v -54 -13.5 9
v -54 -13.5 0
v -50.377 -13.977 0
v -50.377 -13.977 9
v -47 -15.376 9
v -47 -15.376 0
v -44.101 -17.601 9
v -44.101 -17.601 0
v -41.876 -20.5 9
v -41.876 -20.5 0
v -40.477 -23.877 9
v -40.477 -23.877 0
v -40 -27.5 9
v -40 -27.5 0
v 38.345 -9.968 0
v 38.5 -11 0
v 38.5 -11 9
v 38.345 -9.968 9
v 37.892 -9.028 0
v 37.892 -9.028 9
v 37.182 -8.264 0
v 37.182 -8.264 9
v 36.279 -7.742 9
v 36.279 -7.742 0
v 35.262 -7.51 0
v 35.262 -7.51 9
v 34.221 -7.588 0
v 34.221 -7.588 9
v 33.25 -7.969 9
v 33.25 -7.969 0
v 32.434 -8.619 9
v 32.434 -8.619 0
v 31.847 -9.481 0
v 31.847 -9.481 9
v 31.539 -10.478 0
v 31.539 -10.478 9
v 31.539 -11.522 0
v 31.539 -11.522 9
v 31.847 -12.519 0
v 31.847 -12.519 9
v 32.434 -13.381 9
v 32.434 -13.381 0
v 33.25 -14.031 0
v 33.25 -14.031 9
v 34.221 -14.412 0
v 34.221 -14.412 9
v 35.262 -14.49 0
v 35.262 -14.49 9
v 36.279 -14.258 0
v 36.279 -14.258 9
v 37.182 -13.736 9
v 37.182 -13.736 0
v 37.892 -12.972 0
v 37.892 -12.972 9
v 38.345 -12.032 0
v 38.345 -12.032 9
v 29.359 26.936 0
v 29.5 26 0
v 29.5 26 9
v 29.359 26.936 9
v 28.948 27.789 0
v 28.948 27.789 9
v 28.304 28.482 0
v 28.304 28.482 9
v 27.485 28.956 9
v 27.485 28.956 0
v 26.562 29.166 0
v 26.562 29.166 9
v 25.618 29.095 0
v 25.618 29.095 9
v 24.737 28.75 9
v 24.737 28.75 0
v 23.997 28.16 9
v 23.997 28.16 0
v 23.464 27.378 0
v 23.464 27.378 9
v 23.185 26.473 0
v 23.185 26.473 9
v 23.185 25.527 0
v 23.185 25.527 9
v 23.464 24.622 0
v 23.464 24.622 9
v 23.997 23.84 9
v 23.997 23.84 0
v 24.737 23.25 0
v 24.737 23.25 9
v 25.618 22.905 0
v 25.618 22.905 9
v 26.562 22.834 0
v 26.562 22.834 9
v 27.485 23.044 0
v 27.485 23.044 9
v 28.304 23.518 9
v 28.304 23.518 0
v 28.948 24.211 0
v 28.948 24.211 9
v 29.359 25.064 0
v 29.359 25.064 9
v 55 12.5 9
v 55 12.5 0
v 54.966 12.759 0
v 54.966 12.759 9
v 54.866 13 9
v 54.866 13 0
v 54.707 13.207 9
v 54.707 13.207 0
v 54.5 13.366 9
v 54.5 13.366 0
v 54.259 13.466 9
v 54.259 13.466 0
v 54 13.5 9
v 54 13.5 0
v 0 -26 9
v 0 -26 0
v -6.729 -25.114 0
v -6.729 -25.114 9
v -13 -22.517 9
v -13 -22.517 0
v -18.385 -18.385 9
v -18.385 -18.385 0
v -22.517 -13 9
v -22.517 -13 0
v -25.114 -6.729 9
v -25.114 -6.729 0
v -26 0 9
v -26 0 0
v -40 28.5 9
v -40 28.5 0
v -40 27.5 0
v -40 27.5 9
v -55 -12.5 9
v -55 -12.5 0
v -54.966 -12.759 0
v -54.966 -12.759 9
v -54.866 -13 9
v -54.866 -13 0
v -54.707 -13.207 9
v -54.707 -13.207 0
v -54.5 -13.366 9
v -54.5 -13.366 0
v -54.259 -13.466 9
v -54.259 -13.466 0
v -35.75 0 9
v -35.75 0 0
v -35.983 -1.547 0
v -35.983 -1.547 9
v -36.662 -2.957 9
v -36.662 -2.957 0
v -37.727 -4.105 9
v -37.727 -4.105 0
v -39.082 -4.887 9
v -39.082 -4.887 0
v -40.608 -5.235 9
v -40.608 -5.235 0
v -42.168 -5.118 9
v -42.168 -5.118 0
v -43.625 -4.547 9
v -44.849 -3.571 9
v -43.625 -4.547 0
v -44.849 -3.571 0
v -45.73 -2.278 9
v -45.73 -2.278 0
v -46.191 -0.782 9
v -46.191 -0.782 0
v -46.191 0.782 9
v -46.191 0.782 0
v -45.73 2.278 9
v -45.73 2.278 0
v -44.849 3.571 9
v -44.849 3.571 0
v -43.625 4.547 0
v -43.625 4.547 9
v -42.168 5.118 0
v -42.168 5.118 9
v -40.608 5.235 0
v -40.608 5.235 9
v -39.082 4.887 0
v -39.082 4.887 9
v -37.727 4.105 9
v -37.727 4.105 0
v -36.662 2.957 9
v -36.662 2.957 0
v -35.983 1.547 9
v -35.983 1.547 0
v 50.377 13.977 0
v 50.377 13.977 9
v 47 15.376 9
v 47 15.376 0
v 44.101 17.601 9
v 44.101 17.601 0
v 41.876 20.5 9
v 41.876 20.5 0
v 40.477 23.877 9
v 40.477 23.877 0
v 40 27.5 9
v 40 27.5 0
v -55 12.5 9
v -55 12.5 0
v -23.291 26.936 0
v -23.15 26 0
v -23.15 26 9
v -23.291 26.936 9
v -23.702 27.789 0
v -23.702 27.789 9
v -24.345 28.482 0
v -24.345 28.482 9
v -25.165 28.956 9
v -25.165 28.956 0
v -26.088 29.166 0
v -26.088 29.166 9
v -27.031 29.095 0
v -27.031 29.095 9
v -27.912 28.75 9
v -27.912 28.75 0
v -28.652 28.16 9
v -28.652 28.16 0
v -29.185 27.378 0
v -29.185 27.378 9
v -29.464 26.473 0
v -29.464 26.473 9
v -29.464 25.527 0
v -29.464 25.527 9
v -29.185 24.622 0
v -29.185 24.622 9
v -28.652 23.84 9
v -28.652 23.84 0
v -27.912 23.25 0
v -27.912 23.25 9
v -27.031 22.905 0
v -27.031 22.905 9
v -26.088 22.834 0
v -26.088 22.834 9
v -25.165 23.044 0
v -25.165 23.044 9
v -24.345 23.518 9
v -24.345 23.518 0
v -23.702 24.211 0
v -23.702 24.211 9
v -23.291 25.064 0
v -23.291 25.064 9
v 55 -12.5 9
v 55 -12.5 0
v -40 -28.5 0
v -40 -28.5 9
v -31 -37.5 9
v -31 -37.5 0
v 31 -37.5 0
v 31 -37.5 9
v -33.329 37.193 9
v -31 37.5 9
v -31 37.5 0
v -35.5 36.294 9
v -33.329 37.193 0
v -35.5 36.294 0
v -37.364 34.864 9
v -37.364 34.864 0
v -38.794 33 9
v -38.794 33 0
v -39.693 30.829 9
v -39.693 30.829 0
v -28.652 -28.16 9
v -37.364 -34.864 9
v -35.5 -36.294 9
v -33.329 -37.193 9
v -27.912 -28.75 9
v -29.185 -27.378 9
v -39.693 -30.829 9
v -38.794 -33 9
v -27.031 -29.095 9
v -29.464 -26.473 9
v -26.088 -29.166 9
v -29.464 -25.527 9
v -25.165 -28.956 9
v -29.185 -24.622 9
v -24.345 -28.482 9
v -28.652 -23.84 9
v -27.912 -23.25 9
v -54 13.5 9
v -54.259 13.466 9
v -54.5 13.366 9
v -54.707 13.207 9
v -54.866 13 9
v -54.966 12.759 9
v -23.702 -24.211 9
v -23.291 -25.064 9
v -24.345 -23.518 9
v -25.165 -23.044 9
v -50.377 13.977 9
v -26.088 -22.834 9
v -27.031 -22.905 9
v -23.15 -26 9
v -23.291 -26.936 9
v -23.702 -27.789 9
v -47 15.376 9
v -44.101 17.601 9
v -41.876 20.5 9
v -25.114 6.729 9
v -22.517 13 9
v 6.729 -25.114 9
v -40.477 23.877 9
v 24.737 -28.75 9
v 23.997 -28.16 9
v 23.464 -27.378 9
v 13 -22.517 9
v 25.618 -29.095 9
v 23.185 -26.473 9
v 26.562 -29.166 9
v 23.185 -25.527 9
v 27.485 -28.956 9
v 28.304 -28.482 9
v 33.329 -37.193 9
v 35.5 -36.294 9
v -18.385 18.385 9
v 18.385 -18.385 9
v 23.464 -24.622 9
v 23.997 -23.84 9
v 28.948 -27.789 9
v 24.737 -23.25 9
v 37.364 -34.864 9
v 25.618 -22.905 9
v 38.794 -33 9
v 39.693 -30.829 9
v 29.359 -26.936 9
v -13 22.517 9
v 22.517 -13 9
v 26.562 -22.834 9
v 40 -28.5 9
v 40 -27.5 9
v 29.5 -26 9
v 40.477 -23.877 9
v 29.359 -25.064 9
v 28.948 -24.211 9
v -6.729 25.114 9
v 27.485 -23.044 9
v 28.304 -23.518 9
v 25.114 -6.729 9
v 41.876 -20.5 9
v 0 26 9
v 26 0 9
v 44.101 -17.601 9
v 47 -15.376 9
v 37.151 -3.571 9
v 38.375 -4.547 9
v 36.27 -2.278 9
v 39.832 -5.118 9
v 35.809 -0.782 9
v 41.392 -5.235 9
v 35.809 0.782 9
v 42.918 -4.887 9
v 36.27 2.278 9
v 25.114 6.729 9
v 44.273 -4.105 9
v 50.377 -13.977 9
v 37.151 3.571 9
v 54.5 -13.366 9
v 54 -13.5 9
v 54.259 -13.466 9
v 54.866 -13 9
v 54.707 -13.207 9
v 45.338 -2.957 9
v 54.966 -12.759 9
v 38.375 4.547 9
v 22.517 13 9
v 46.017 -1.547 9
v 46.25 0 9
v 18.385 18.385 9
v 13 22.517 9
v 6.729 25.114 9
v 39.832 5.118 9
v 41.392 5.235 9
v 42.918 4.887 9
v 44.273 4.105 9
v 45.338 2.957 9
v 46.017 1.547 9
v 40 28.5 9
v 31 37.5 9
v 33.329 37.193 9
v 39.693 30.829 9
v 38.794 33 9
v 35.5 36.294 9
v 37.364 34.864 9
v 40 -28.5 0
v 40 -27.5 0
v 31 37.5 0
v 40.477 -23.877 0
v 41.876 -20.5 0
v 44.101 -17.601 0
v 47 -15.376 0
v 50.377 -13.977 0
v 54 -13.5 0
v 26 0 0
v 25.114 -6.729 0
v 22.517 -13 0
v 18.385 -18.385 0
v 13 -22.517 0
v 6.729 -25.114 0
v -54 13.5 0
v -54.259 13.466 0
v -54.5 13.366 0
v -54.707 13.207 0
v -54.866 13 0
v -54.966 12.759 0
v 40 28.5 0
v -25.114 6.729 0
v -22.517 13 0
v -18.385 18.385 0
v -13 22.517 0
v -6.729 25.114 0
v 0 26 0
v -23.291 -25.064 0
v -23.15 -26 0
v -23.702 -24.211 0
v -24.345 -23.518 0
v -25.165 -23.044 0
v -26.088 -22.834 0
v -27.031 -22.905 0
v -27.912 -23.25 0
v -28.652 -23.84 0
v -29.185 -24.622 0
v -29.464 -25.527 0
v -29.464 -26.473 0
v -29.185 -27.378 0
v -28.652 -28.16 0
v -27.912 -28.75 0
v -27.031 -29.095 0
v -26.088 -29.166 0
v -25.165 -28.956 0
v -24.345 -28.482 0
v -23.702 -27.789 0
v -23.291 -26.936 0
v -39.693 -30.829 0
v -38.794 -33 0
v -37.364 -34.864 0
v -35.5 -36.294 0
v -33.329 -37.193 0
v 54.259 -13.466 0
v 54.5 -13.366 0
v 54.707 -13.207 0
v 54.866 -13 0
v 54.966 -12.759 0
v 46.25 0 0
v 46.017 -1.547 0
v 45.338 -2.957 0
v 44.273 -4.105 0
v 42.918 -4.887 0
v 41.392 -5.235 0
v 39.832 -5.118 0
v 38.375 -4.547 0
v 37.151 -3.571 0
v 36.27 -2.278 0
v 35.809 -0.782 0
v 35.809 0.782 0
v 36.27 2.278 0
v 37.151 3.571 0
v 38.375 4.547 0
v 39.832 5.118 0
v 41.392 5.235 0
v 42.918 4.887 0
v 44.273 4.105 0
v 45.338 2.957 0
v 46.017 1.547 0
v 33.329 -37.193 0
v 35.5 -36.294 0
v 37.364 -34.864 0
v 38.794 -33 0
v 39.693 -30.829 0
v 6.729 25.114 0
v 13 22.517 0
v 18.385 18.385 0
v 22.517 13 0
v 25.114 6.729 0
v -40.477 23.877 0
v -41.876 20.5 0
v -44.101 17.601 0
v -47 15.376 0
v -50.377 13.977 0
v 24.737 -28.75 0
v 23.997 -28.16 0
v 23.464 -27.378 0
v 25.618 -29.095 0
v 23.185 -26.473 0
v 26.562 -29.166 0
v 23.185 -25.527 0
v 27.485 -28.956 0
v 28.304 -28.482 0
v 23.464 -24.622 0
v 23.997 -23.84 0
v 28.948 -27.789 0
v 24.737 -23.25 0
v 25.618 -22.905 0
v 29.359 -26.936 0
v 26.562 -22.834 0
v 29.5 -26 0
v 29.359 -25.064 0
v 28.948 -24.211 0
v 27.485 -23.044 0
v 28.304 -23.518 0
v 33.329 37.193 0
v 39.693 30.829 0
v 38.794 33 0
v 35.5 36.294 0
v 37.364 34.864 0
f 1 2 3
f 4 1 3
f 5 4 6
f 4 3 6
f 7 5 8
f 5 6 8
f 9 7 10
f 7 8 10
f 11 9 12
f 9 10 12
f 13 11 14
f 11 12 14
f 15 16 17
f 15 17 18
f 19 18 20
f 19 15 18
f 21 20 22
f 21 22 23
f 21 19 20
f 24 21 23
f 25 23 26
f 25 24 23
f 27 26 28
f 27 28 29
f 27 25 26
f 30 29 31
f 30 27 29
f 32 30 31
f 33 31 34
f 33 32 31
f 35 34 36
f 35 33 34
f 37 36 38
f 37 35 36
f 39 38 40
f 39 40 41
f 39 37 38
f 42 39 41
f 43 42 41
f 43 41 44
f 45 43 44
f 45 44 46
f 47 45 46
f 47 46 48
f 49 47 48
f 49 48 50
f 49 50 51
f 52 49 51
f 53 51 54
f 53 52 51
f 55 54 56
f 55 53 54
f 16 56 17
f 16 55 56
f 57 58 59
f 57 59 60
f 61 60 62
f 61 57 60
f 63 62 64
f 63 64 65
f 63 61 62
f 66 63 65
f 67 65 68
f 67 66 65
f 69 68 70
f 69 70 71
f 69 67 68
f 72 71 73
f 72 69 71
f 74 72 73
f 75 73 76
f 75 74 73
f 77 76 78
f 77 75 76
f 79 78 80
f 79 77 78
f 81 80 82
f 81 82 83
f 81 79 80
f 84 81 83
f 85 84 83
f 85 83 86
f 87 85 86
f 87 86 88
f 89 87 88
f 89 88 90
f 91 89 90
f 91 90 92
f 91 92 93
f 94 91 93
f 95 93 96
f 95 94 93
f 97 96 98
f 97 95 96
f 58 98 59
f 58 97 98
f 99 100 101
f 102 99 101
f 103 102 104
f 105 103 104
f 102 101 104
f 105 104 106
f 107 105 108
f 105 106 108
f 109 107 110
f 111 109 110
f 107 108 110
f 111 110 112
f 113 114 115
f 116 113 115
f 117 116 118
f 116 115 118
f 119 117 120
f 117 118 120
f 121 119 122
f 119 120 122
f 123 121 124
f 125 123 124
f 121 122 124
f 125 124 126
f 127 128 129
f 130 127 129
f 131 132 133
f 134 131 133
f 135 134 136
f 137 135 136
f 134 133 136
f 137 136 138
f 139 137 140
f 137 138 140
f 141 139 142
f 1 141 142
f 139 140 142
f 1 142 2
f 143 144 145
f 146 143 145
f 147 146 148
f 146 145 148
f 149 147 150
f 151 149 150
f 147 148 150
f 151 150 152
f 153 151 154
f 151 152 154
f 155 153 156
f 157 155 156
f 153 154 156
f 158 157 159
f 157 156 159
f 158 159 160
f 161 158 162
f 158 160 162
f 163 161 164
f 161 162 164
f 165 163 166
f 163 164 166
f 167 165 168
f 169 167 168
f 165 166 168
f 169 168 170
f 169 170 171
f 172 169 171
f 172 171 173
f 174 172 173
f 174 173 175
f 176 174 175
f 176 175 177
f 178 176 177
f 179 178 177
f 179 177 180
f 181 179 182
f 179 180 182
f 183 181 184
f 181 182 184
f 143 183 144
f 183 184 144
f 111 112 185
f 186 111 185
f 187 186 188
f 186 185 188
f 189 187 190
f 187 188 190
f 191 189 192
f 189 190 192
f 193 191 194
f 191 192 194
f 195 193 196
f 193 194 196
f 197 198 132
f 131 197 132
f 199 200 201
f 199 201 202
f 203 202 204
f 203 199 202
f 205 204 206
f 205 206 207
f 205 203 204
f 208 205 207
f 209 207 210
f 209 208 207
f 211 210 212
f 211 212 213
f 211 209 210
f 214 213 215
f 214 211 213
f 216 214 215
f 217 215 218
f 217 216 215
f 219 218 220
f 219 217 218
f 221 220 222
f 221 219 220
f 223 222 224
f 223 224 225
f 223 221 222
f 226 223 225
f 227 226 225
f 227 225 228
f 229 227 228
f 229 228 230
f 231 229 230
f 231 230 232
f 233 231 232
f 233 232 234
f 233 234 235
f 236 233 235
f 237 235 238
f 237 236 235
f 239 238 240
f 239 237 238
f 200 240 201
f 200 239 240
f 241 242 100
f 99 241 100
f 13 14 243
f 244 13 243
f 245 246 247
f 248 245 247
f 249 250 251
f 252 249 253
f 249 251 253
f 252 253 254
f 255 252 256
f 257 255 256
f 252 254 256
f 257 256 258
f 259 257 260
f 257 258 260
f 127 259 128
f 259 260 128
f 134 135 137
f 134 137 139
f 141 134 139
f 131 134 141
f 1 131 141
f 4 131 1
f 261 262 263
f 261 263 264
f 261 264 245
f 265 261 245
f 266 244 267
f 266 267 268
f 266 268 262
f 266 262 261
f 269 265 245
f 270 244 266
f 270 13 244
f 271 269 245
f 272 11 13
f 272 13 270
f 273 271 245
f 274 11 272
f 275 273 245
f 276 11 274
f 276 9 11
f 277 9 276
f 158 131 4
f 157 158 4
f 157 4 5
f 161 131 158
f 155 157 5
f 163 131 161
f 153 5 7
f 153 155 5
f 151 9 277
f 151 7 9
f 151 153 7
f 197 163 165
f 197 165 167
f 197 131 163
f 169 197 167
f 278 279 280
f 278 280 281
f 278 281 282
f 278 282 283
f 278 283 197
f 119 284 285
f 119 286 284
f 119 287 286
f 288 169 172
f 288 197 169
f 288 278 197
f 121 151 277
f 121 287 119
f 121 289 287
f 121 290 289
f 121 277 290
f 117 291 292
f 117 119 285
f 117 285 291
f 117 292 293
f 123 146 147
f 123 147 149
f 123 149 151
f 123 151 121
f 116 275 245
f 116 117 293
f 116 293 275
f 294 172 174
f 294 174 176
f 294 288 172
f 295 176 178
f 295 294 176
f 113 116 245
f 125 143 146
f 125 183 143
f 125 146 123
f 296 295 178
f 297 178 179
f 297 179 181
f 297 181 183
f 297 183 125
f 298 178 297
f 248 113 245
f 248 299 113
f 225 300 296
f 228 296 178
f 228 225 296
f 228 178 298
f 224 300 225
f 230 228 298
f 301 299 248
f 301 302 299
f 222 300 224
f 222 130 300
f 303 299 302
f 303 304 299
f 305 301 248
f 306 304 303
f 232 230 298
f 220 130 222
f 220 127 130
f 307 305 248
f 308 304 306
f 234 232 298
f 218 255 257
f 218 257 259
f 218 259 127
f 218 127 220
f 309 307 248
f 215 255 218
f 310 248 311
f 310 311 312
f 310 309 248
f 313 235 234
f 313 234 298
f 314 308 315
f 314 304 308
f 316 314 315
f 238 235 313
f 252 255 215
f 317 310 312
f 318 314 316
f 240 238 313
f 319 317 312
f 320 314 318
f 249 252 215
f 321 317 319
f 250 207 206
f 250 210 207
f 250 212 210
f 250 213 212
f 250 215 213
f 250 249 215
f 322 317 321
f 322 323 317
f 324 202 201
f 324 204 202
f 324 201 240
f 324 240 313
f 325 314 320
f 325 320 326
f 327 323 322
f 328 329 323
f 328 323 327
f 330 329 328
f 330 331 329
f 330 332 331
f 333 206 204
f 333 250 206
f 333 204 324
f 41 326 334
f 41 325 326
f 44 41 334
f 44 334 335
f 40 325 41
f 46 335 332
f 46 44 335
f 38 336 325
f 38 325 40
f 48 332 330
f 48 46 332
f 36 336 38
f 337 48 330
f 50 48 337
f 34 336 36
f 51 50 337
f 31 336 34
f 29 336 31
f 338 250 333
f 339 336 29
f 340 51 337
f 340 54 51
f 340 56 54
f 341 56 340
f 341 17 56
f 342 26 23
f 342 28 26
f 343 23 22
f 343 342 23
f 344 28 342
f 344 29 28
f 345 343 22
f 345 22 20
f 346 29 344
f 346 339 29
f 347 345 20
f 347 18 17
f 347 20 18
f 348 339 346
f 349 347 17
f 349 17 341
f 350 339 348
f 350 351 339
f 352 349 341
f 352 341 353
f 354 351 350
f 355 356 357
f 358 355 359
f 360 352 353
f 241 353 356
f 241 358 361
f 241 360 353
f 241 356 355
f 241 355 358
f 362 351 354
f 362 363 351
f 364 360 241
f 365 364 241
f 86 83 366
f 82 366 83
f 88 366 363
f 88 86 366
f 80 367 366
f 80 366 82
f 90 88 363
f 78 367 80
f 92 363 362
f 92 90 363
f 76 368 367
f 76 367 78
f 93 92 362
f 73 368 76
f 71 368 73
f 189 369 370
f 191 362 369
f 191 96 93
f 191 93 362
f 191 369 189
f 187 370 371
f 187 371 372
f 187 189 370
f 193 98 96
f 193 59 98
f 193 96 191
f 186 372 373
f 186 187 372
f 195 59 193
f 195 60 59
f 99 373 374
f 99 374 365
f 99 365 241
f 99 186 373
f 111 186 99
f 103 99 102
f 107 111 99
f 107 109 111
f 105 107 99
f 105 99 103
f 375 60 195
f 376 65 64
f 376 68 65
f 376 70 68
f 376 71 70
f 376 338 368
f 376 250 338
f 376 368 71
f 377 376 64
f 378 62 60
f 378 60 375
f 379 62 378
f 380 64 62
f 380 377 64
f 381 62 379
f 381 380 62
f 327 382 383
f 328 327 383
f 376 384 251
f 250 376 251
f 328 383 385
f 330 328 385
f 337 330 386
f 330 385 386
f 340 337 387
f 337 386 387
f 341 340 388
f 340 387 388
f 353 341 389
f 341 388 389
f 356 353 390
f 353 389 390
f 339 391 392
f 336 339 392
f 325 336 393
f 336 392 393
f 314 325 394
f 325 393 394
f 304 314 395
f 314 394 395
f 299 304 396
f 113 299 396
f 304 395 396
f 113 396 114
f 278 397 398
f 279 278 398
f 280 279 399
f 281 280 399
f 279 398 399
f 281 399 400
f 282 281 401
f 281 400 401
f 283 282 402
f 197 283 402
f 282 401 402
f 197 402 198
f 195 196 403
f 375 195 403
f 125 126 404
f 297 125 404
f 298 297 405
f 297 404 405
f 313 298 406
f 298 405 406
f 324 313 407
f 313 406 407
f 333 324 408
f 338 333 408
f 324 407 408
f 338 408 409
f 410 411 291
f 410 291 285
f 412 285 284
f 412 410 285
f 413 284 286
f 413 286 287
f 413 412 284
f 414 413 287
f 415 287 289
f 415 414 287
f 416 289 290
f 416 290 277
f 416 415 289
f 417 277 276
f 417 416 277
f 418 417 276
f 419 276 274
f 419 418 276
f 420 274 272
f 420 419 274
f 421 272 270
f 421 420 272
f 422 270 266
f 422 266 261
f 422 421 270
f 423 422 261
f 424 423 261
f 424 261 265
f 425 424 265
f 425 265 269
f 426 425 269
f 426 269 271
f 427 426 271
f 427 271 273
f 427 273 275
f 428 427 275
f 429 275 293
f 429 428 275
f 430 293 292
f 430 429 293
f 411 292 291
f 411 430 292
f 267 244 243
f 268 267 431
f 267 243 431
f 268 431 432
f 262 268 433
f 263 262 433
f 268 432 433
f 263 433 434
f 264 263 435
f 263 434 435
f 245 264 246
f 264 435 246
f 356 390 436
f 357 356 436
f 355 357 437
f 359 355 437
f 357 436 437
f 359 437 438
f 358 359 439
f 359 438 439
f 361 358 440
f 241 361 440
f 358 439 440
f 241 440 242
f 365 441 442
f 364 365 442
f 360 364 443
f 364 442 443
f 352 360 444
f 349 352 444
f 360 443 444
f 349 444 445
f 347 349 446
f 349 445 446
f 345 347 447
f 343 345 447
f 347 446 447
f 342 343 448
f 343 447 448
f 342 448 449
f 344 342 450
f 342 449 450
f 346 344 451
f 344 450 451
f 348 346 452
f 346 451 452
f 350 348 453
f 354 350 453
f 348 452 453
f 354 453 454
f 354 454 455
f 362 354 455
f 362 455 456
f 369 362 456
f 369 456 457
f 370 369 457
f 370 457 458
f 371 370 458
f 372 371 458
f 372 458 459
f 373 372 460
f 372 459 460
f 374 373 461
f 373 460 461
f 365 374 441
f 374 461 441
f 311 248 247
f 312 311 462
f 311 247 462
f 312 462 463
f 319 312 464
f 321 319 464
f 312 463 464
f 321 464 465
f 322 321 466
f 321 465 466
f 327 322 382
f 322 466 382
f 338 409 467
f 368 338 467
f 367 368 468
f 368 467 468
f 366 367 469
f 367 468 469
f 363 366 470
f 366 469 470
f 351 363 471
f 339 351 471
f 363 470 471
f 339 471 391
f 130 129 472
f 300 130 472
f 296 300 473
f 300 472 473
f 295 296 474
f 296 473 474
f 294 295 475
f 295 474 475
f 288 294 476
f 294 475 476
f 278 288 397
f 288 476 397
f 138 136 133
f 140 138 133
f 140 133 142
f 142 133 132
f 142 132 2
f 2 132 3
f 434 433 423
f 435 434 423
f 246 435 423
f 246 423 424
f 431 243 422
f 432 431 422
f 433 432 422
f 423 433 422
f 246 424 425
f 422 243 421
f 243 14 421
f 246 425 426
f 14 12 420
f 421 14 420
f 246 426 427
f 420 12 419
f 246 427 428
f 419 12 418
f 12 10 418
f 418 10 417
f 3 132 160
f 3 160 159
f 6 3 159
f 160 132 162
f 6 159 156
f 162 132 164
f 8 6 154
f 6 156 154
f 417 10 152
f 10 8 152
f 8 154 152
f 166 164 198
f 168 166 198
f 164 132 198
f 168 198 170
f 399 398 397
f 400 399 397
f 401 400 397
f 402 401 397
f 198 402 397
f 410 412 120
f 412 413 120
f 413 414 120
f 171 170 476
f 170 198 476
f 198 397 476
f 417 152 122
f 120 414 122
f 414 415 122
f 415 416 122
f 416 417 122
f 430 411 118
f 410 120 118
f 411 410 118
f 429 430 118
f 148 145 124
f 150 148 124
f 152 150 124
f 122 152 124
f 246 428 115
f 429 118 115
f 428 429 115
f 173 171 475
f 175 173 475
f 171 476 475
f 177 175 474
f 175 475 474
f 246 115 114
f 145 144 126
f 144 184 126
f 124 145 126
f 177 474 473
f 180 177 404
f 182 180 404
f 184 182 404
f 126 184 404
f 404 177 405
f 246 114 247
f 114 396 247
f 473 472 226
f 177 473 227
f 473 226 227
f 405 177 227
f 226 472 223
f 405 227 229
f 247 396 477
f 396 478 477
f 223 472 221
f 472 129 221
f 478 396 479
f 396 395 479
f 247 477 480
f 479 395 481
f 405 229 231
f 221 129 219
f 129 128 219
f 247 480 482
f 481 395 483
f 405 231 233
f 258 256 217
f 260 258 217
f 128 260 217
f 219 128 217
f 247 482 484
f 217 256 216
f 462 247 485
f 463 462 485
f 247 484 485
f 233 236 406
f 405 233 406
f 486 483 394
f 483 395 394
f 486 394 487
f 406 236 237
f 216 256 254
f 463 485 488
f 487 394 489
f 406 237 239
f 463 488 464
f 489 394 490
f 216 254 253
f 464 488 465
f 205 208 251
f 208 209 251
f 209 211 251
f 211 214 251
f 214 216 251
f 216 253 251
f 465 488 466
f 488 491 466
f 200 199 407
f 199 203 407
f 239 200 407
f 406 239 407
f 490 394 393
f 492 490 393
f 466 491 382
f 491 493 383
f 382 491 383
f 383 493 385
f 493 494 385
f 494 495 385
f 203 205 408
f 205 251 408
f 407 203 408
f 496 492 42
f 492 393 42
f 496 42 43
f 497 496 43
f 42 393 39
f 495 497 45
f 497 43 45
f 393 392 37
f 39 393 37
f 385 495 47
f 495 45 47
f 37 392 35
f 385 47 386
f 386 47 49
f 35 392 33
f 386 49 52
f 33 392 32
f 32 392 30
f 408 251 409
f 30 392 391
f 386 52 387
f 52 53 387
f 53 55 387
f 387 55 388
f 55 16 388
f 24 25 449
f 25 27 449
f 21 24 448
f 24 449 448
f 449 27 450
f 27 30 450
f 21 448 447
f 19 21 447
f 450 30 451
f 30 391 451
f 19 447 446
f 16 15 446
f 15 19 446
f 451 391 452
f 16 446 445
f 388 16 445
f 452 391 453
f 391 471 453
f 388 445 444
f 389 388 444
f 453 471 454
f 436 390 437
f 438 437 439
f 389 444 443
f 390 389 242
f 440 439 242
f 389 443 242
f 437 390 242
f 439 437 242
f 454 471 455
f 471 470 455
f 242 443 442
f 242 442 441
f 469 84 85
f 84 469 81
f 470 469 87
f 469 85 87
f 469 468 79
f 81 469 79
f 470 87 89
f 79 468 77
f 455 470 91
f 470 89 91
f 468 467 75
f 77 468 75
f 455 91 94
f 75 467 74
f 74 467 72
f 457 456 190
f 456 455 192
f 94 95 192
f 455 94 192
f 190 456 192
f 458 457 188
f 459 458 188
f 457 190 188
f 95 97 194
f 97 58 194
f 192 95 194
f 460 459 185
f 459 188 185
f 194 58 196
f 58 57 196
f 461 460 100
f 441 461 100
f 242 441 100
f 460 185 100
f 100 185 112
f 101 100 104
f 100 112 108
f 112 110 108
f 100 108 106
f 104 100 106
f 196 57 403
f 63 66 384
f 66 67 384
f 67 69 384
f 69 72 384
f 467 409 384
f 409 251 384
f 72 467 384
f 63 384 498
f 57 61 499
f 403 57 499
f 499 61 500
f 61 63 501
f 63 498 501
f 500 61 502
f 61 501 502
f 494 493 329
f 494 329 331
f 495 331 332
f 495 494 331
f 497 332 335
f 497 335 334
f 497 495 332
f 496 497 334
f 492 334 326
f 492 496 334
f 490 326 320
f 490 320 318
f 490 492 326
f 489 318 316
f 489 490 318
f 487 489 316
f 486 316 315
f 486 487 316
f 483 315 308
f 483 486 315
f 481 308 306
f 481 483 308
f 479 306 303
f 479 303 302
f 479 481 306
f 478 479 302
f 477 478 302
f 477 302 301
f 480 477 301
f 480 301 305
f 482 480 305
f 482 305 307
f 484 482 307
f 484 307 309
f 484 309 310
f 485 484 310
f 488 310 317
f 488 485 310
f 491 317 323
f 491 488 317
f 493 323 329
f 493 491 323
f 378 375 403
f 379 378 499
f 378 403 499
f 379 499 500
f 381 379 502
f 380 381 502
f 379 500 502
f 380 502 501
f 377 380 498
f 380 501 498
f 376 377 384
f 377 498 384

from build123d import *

# Parameters (mm, degrees)
F0_R     = 3.175
F0_R_2   = 6
F0_R_3   = 3.5
F1_DEPTH = 9


with BuildPart() as f1:
    # F0 (on Top) → F1 (new body)
    with BuildSketch(Plane.XY):
        with BuildLine():
            Line((0, 26), (0, 37.5))
            Line((0, 37.5), (-31, 37.5))
            ThreePointArc((-31, 37.5), (-37.363961, 34.863961), (-40, 28.5))
            Line((-40, 28.5), (-40, 27.5))
            ThreePointArc((-40, 27.5), (-44.100505, 17.600505), (-54, 13.5))
            ThreePointArc((-54, 13.5), (-54.707107, 13.207107), (-55, 12.5))
            Line((-55, 12.5), (-55, 0))
            Line((-55, 0), (-46.25, 0))
            ThreePointArc((-46.25, 0), (-41, 5.25), (-35.75, 0))
            Line((-35.75, 0), (-26, 0))
            ThreePointArc((-26, 0), (-18.384776, 18.384776), (0, 26))
        make_face()
        with Locations((-26.324893, 26)):
            Circle(F0_R, mode=Mode.SUBTRACT)
        with BuildLine():
            Line((31, 37.5), (0, 37.5))
            Line((0, 37.5), (0, 26))
            ThreePointArc((0, 26), (18.384776, 18.384776), (26, 0))
            Line((26, 0), (35.75, 0))
            ThreePointArc((35.75, 0), (41, 5.25), (46.25, 0))
            Line((46.25, 0), (55, 0))
            Line((55, 0), (55, 12.5))
            ThreePointArc((55, 12.5), (54.707107, 13.207107), (54, 13.5))
            ThreePointArc((54, 13.5), (44.100505, 17.600505), (40, 27.5))
            Line((40, 27.5), (40, 28.5))
            ThreePointArc((40, 28.5), (37.363961, 34.863961), (31, 37.5))
        make_face()
        with Locations((26.324893, 26)):
            Circle(F0_R, mode=Mode.SUBTRACT)
        with BuildLine():
            ThreePointArc((0, -26), (-18.384776, -18.384776), (-26, 0))
            Line((-26, 0), (-35.75, 0))
            ThreePointArc((-35.75, 0), (-41, -5.25), (-46.25, 0))
            Line((-46.25, 0), (-55, 0))
            Line((-55, 0), (-55, -12.5))
            ThreePointArc((-55, -12.5), (-54.707107, -13.207107), (-54, -13.5))
            ThreePointArc((-54, -13.5), (-44.100505, -17.600505), (-40, -27.5))
            Line((-40, -27.5), (-40, -28.5))
            ThreePointArc((-40, -28.5), (-37.363961, -34.863961), (-31, -37.5))
            Line((-31, -37.5), (0, -37.5))
            Line((0, -37.5), (0, -26))
        make_face()
        with Locations((-26.324893, -26)):
            Circle(F0_R, mode=Mode.SUBTRACT)
        with BuildLine():
            Line((35.75, 0), (26, 0))
            ThreePointArc((26, 0), (18.384776, -18.384776), (0, -26))
            Line((0, -26), (0, -37.5))
            Line((0, -37.5), (31, -37.5))
            ThreePointArc((31, -37.5), (37.363961, -34.863961), (40, -28.5))
            Line((40, -28.5), (40, -27.5))
            ThreePointArc((40, -27.5), (44.100505, -17.600505), (54, -13.5))
            ThreePointArc((54, -13.5), (54.707107, -13.207107), (55, -12.5))
            Line((55, -12.5), (55, 0))
            Line((55, 0), (46.25, 0))
            ThreePointArc((46.25, 0), (41, -5.25), (35.75, 0))
        make_face()
        with Locations((26.324893, -26)):
            Circle(F0_R, mode=Mode.SUBTRACT)
        with Locations((35, -11)):
            Circle(F0_R_2, mode=Mode.SUBTRACT)
        with Locations((35, -11)):
            Circle(F0_R_2)
        with Locations((35, -11)):
            Circle(F0_R_3, mode=Mode.SUBTRACT)
    extrude(amount=F1_DEPTH)


solid = f1.part
